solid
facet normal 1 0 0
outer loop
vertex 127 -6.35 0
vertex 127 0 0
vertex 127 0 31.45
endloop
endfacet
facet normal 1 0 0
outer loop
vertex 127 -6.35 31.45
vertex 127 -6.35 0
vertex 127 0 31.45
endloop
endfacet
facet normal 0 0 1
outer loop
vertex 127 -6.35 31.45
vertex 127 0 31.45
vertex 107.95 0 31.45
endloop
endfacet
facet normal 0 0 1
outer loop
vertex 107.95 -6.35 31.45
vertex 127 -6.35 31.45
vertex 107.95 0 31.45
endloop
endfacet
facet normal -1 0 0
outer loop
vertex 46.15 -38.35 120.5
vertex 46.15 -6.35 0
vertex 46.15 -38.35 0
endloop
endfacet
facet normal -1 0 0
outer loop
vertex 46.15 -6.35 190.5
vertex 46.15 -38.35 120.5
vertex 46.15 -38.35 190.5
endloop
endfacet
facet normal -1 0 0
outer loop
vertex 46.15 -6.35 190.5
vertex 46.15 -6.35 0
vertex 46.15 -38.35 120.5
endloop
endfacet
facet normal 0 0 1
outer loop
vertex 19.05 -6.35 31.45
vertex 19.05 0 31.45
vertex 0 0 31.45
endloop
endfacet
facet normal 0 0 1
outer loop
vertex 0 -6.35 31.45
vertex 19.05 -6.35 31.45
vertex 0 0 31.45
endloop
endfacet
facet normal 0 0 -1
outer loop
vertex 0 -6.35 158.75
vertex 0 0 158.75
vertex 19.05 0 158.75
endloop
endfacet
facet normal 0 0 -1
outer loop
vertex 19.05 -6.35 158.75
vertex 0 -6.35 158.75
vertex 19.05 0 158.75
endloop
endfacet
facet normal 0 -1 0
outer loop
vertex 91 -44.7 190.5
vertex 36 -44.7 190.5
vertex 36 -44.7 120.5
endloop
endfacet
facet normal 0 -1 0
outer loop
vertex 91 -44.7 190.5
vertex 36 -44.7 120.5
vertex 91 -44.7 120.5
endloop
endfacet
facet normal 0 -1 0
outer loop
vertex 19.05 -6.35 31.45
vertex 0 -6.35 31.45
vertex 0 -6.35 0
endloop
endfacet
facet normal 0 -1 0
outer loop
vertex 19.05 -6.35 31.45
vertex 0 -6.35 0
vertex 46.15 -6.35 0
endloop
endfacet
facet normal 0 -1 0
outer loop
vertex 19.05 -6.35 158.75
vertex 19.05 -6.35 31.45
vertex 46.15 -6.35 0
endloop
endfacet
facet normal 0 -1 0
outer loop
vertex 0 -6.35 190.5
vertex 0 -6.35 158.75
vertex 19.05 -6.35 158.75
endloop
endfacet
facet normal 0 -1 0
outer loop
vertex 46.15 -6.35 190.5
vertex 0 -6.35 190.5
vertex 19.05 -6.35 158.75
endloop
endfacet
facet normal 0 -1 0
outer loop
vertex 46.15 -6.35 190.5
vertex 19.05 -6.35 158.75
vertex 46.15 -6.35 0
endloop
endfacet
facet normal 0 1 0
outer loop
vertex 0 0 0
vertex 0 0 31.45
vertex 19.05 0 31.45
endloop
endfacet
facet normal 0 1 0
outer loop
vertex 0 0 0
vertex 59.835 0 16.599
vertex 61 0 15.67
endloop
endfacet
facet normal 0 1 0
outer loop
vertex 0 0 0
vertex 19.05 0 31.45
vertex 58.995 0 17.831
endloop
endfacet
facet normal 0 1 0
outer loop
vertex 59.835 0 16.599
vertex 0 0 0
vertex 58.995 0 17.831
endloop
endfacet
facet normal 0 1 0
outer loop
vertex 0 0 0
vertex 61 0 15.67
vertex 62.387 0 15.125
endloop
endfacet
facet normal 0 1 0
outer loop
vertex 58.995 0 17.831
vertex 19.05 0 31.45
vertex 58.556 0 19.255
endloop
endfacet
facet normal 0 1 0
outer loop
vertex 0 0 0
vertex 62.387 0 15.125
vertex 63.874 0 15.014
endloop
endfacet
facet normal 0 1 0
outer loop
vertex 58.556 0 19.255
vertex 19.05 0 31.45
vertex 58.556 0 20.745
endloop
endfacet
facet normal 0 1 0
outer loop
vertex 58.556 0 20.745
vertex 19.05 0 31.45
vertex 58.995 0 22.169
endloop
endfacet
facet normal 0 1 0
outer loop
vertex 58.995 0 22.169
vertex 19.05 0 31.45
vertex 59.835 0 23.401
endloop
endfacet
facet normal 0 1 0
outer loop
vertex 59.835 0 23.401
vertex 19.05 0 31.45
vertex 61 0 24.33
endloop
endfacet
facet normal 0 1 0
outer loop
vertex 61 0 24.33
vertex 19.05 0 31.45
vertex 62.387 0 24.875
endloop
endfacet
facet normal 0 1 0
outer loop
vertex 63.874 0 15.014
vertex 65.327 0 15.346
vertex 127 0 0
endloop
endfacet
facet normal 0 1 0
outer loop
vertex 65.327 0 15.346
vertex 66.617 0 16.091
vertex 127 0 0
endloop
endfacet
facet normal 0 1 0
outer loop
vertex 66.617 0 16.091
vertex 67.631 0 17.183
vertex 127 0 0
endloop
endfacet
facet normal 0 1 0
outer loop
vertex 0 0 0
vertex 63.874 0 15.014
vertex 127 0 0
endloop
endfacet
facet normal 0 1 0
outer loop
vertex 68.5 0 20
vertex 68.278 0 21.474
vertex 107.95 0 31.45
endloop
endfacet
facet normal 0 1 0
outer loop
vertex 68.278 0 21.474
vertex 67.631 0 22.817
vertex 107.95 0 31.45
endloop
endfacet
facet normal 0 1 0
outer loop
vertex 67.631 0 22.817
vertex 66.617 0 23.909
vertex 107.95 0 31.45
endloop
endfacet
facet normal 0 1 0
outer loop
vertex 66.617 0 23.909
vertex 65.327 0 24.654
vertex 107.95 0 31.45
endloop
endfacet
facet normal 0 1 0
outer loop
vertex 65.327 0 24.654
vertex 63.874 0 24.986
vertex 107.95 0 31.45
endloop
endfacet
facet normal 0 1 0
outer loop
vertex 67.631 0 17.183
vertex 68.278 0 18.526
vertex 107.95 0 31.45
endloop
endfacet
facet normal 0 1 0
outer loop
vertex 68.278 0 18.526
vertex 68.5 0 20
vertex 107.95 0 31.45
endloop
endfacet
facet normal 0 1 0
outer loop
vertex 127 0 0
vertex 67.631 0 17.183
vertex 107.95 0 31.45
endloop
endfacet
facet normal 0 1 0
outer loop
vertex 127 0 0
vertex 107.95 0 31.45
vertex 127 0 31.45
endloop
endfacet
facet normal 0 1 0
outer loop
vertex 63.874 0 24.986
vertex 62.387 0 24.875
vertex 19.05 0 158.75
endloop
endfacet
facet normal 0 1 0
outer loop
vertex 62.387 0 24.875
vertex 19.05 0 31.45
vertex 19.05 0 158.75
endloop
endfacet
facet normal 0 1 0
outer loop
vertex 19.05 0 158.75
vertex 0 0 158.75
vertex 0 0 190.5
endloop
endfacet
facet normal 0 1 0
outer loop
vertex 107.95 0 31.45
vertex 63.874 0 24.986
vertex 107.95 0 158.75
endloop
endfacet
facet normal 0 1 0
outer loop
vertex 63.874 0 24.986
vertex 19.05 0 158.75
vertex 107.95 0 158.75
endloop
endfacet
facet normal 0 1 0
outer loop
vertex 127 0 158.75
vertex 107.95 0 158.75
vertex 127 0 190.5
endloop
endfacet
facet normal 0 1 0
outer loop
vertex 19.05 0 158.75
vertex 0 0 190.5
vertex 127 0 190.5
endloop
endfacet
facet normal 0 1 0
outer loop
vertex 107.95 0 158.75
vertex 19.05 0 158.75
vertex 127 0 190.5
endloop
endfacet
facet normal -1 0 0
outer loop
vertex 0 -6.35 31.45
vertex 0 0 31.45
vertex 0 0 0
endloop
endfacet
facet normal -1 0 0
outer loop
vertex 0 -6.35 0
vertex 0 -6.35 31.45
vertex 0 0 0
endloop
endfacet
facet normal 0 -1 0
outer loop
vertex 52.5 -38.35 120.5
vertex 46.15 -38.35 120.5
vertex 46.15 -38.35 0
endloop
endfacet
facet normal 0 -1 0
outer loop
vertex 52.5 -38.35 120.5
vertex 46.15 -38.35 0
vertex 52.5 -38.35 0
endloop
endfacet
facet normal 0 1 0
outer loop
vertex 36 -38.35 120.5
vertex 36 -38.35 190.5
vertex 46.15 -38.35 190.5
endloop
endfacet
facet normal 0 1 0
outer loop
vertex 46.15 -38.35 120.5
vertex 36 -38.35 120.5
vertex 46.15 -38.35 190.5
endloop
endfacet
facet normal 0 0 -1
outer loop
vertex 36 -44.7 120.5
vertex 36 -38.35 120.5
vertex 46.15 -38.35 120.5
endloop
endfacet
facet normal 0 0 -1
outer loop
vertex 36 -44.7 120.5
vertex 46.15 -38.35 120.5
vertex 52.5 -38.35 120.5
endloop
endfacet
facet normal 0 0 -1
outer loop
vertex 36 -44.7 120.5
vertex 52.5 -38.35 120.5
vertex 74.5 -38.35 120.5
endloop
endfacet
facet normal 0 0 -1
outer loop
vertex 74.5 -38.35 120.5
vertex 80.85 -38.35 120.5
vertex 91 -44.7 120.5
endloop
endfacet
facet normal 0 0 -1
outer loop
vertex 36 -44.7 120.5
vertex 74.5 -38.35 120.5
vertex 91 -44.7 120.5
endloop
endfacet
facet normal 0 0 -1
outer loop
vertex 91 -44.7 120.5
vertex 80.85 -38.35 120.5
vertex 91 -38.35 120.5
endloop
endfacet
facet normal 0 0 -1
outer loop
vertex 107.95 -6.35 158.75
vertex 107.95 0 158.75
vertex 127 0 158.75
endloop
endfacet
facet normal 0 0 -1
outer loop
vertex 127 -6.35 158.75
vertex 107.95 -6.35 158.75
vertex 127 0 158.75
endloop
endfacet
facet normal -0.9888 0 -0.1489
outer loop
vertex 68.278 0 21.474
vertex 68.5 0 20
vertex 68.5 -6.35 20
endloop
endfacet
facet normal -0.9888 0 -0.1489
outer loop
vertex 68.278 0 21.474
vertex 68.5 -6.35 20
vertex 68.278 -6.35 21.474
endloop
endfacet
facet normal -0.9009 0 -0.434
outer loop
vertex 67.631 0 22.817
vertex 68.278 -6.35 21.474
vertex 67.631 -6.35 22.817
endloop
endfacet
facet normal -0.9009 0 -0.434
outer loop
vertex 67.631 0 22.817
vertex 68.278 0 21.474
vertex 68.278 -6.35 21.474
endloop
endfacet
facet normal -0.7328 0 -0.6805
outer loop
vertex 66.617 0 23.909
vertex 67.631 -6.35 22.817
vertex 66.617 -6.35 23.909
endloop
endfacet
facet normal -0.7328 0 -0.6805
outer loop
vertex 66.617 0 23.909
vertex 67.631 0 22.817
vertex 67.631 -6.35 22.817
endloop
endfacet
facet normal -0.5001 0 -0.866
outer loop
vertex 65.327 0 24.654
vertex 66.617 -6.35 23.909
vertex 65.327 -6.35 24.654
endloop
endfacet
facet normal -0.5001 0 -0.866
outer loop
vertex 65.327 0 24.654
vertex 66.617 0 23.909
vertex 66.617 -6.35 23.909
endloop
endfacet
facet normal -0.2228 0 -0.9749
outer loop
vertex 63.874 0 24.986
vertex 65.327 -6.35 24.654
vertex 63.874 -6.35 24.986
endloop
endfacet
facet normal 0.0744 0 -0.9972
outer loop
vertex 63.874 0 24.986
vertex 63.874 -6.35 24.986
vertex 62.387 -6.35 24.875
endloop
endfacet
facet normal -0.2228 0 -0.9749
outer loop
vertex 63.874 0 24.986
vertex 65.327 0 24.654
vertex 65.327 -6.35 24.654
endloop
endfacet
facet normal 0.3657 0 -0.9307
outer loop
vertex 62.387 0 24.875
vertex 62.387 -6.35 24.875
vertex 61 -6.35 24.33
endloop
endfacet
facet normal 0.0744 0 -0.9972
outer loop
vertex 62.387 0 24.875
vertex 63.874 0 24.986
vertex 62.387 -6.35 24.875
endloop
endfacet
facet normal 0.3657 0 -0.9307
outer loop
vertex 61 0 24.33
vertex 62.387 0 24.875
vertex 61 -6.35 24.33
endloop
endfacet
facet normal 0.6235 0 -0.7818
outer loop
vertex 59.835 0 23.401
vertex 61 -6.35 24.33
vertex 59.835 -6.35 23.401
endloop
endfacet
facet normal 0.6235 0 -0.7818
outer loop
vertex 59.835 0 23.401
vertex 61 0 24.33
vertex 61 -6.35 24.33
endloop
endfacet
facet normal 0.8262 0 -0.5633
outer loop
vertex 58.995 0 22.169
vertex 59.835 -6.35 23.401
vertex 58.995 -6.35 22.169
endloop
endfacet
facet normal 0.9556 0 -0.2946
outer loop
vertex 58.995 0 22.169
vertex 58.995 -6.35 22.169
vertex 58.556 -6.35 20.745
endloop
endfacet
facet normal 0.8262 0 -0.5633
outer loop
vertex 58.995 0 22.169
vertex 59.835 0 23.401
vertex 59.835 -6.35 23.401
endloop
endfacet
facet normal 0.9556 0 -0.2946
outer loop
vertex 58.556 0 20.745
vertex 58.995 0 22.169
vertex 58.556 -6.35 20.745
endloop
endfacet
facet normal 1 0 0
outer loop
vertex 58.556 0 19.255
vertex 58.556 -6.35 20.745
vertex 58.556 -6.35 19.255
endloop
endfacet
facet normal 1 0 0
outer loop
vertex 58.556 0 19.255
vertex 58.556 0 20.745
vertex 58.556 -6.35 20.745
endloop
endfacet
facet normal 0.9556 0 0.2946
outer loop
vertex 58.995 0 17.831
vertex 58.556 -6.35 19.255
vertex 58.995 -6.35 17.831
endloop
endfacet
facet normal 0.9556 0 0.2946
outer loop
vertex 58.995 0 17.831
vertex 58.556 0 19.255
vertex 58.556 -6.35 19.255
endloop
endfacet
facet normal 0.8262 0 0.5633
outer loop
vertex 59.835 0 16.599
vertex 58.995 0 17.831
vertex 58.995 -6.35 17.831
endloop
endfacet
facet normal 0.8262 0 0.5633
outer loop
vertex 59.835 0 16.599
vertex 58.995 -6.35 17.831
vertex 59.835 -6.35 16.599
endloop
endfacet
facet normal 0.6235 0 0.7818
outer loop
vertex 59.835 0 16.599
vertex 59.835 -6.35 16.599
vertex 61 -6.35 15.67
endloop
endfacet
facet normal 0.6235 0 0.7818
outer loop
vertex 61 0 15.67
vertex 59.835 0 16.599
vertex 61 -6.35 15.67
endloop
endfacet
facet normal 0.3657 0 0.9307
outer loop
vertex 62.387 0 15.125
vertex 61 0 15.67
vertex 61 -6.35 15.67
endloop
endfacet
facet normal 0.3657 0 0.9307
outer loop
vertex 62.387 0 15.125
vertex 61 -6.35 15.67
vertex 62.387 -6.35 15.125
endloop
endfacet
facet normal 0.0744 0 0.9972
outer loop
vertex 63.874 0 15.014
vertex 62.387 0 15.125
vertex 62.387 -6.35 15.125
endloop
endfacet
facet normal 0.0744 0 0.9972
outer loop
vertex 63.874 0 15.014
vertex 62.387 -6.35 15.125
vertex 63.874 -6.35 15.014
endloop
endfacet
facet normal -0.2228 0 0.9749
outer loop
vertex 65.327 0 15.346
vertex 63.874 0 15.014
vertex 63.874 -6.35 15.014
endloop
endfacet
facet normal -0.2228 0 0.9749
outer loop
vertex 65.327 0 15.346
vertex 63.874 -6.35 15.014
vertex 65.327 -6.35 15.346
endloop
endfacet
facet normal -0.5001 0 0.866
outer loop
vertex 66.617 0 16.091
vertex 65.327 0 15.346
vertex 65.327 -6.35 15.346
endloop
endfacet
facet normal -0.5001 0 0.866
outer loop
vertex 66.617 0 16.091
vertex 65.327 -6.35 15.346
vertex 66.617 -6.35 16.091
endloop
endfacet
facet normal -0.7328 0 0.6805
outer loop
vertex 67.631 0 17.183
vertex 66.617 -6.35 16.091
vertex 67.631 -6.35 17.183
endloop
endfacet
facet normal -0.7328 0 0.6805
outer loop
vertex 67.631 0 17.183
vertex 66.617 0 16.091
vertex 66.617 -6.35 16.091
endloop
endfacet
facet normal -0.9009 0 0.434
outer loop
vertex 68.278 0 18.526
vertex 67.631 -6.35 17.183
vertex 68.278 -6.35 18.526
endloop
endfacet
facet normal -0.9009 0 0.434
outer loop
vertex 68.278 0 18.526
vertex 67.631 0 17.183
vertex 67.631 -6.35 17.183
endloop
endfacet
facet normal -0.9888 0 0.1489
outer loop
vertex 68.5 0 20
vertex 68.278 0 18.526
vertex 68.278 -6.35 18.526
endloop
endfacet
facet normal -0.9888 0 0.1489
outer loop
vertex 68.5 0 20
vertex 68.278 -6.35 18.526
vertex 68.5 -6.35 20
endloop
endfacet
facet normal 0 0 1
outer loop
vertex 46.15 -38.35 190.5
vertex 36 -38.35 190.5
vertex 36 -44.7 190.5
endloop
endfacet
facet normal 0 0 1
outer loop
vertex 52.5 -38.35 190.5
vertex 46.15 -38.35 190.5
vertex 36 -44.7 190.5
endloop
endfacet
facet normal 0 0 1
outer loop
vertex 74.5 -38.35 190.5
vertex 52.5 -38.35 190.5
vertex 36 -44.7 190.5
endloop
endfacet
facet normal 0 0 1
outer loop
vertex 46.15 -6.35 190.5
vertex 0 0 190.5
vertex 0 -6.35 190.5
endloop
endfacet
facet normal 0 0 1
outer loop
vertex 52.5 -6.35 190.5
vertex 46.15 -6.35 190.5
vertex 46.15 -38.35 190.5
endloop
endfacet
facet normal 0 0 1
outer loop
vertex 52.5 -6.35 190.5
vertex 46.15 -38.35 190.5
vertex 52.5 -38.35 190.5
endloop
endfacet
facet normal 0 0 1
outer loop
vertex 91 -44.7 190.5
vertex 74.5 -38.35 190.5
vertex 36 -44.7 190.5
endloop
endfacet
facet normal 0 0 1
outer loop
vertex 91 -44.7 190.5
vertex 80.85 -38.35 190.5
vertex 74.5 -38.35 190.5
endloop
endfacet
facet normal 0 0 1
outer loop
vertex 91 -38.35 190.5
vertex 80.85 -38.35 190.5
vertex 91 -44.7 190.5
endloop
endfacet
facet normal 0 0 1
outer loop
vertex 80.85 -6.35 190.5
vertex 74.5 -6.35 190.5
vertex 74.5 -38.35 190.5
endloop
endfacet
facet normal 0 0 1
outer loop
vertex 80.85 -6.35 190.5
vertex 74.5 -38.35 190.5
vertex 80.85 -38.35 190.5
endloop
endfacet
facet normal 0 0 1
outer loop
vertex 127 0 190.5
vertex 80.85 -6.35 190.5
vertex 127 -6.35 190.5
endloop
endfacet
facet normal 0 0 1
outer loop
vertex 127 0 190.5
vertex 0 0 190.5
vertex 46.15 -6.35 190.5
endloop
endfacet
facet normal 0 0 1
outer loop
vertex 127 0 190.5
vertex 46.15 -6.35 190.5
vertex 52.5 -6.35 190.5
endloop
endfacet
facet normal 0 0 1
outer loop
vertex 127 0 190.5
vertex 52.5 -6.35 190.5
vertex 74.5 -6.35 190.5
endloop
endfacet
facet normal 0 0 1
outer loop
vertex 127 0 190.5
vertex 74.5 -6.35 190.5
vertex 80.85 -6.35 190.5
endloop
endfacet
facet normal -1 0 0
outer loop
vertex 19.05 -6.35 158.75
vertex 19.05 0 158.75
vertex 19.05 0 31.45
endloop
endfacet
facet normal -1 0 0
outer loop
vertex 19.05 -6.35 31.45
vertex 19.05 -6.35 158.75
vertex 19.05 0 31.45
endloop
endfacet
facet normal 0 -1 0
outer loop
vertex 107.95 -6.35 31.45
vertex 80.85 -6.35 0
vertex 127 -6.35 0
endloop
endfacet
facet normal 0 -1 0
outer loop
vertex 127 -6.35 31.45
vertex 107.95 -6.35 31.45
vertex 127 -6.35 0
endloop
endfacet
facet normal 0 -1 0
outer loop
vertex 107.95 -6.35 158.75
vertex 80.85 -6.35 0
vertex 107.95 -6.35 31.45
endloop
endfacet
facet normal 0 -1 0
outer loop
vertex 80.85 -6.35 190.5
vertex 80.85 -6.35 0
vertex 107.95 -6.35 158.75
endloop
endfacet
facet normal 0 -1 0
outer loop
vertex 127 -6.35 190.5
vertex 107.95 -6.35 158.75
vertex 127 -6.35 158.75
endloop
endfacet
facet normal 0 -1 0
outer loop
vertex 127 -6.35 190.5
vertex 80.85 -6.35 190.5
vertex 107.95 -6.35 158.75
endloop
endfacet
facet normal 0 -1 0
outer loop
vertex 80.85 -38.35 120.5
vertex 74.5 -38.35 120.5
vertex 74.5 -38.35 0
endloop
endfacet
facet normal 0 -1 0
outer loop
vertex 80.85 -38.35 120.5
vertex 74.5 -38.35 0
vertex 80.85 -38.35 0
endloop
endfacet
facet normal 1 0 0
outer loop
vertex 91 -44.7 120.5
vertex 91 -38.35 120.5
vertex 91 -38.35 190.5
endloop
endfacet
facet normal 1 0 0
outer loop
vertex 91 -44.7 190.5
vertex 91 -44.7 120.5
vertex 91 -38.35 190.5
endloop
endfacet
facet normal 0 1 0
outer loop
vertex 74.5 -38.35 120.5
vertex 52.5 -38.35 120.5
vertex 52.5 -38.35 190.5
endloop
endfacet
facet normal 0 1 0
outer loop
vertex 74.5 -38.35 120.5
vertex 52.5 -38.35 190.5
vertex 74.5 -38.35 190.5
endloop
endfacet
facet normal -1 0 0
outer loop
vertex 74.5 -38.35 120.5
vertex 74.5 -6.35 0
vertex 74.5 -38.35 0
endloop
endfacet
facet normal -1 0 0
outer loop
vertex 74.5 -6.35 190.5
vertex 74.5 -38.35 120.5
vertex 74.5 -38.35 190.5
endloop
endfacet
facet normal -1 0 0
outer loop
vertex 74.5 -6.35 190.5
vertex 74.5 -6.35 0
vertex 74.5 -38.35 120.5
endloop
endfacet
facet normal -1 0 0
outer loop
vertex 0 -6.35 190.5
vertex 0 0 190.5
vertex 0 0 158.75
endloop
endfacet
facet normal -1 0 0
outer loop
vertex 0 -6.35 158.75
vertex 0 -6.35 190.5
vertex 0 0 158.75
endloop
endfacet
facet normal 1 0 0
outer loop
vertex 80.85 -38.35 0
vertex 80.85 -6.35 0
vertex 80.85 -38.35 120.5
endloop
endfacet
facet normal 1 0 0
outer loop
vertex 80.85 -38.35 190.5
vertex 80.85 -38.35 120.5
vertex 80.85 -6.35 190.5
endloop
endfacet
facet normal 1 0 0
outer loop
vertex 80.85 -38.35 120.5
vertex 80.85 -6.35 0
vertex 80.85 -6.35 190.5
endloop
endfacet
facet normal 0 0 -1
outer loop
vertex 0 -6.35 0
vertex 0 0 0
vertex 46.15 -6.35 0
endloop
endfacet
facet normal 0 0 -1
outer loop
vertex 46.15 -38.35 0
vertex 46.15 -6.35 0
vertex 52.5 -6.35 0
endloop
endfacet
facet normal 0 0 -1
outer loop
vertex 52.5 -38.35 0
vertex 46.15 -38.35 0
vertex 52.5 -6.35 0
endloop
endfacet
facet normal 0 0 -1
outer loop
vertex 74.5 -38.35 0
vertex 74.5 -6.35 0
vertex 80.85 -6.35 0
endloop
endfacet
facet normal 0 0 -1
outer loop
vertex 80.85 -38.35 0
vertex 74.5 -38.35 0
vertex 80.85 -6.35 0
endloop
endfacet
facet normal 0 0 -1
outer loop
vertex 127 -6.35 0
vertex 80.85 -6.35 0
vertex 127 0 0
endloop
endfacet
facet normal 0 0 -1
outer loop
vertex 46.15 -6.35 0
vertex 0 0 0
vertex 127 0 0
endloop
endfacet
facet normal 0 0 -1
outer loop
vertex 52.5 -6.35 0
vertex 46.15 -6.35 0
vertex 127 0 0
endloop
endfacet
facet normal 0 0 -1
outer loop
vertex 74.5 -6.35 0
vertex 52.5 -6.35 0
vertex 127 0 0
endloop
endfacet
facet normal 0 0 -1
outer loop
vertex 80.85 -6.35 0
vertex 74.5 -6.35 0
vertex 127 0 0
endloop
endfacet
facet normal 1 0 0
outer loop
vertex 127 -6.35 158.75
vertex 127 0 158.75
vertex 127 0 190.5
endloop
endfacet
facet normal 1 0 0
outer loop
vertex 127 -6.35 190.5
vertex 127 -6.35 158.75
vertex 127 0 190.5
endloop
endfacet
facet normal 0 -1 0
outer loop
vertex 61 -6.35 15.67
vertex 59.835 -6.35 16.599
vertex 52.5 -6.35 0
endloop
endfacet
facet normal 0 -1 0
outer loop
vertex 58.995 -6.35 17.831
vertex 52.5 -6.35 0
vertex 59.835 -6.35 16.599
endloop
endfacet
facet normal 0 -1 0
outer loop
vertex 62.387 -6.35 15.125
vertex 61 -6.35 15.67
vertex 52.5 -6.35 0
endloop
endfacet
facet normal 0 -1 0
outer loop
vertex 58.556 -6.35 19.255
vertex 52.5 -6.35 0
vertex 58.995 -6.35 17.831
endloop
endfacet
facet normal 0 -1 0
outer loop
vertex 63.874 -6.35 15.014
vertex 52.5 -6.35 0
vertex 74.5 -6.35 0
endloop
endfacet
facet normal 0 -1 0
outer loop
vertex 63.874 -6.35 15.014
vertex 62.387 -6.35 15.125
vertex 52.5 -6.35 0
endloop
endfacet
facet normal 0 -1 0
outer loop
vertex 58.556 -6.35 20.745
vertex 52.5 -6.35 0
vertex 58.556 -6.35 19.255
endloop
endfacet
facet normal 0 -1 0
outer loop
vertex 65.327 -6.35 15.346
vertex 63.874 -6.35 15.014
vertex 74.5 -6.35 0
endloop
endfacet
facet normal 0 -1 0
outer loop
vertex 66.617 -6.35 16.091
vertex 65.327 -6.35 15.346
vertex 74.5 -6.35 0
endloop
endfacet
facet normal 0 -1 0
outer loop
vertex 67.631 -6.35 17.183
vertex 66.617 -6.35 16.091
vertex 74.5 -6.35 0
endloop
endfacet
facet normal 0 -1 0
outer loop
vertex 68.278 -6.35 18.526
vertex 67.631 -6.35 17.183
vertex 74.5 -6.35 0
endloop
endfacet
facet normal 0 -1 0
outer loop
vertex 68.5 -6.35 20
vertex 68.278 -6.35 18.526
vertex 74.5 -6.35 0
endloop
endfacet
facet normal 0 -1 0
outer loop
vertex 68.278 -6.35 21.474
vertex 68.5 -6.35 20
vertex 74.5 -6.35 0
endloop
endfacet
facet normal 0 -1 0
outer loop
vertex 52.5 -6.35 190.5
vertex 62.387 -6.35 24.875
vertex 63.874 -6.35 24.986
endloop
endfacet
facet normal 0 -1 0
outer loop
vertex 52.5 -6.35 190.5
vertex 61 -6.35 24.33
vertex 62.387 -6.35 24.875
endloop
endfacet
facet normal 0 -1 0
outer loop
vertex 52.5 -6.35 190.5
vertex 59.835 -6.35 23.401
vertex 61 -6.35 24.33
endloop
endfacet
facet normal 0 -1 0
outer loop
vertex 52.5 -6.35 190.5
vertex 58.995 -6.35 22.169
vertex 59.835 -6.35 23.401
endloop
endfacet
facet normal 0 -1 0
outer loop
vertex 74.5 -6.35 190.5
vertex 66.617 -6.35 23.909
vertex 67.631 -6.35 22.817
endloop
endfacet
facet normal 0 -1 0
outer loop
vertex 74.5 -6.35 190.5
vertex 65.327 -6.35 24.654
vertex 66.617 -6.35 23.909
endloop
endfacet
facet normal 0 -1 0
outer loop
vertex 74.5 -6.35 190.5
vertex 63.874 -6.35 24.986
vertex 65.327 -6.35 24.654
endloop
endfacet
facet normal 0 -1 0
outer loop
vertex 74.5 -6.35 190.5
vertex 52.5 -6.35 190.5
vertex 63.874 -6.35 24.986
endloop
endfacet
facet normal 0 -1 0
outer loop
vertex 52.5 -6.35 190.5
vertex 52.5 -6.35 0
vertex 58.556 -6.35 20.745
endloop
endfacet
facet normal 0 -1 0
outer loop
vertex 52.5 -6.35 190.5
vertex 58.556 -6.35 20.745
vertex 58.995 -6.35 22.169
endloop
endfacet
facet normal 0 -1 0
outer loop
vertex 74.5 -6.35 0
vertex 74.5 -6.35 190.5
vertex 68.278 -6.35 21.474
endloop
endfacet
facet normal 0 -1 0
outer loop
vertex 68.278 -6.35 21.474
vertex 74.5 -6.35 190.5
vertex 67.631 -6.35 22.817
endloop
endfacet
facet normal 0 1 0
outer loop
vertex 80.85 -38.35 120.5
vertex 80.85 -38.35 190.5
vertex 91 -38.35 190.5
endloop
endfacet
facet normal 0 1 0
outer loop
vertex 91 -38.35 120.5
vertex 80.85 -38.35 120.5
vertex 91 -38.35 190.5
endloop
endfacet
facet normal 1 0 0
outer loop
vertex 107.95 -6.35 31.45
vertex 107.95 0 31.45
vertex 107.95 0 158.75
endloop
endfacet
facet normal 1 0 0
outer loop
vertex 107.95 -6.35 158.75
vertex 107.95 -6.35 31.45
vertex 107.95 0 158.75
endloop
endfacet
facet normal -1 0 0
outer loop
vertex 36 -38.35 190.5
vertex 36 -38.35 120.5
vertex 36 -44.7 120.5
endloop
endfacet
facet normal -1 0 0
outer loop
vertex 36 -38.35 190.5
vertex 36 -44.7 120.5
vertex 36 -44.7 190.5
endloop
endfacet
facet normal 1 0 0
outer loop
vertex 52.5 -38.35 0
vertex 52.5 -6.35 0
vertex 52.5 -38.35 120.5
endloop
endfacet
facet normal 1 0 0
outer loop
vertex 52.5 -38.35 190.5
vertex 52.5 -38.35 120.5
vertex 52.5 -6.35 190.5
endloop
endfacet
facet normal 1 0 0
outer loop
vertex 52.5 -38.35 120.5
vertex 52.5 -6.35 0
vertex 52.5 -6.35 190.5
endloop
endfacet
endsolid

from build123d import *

# Parameters (mm, degrees)
F0_W     = 6.35
F0_H     = 190.5
F1_DEPTH = 38.35
F0_W_2   = 22
F0_R     = 5
F2_DEPTH = 6.35
F3_W     = 55
F3_H     = 70
F4_DEPTH = 6.35


with BuildPart() as f1:
    # F0 (on Front) → F1 (new body)
    with BuildSketch(Plane.XZ):
        with Locations((49.325, 95.25)):
            Rectangle(F0_W, F0_H)
        with Locations((77.675, 95.25)):
            Rectangle(F0_W, F0_H)
    extrude(amount=F1_DEPTH)

    # F0 (on Front) → F2 (join)
    with BuildSketch(Plane.XZ):
        Polygon((0, 25.1), (0, 0), (46.15, 0), (46.15, 190.5), (0, 190.5), (0, 158.75), (19.05, 158.75), (19.05, 31.45), (0, 31.45), align=None)
        with Locations((49.325, 95.25)):
            Rectangle(F0_W, F0_H)
        with Locations((63.5, 95.25)):
            Rectangle(F0_W_2, F0_H)
        with Locations((63.5, 20)):
            Circle(F0_R, mode=Mode.SUBTRACT)
        with Locations((77.675, 95.25)):
            Rectangle(F0_W, F0_H)
        Polygon((80.85, 190.5), (80.85, 0), (127, 0), (127, 31.45), (107.95, 31.45), (107.95, 158.75), (127, 158.75), (127, 190.5), align=None)
    extrude(amount=F2_DEPTH)

    # F3 (on face) → F4 (join)
    with BuildSketch(Plane.XZ.offset(38.35)):
        with Locations((63.5, 155.5)):
            Rectangle(F3_W, F3_H)
    extrude(amount=F4_DEPTH)


solid = f1.part
